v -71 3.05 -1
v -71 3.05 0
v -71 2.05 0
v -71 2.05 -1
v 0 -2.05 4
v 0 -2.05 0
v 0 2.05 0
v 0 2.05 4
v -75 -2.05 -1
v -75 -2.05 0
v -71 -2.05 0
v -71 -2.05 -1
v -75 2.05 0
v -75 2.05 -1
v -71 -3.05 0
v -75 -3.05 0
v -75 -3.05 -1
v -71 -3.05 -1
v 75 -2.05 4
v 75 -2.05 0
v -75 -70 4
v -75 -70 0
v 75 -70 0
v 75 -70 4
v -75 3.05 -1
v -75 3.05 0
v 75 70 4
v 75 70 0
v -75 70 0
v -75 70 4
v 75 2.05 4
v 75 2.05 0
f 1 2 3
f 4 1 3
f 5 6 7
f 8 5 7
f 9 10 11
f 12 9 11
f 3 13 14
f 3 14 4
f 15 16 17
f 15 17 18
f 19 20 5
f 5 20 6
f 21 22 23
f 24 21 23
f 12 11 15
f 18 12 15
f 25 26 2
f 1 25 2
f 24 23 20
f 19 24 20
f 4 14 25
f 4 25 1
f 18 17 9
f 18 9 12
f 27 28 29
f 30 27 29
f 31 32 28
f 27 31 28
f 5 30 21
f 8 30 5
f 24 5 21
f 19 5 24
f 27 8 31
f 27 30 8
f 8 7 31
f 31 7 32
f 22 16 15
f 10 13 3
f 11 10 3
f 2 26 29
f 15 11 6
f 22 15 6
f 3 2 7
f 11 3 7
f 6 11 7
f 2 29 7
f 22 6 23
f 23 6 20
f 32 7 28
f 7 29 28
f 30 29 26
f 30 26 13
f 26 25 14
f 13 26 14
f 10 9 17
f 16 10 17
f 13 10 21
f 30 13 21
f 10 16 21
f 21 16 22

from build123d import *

# Parameters (mm, degrees)
PAD_DEPTH    = 4
SKETCH001_W  = 4
SKETCH001_H  = 1
PAD001_DEPTH = 1
SKETCH002_W  = 4
SKETCH002_H  = 1
PAD002_DEPTH = 1


with BuildPart() as part:
    # Sketch → Pad (new body)
    with BuildSketch(Plane.XY):
        Polygon((75, 70), (-75, 70), (-75, -70), (75, -70), (75, -2.05), (0, -2.05), (0, 2.05), (75, 2.05), align=None)
    extrude(amount=PAD_DEPTH)

    # Sketch001 (on Face9 of Pad) → Pad001 (join)
    with BuildSketch(Plane(origin=(0, 0, 0), x_dir=(1, 0, 0), z_dir=(0, 0, -1))):
        with Locations((-73, 2.55)):
            Rectangle(SKETCH001_W, SKETCH001_H)
    extrude(amount=PAD001_DEPTH)

    # Sketch002 (on Face4 of Pad001) → Pad002 (join)
    with BuildSketch(Plane(origin=(0, 0, 0), x_dir=(1, 0, 0), z_dir=(0, 0, -1))):
        with Locations((-73, -2.55)):
            Rectangle(SKETCH002_W, SKETCH002_H)
    extrude(amount=PAD002_DEPTH)


solid = part.part
